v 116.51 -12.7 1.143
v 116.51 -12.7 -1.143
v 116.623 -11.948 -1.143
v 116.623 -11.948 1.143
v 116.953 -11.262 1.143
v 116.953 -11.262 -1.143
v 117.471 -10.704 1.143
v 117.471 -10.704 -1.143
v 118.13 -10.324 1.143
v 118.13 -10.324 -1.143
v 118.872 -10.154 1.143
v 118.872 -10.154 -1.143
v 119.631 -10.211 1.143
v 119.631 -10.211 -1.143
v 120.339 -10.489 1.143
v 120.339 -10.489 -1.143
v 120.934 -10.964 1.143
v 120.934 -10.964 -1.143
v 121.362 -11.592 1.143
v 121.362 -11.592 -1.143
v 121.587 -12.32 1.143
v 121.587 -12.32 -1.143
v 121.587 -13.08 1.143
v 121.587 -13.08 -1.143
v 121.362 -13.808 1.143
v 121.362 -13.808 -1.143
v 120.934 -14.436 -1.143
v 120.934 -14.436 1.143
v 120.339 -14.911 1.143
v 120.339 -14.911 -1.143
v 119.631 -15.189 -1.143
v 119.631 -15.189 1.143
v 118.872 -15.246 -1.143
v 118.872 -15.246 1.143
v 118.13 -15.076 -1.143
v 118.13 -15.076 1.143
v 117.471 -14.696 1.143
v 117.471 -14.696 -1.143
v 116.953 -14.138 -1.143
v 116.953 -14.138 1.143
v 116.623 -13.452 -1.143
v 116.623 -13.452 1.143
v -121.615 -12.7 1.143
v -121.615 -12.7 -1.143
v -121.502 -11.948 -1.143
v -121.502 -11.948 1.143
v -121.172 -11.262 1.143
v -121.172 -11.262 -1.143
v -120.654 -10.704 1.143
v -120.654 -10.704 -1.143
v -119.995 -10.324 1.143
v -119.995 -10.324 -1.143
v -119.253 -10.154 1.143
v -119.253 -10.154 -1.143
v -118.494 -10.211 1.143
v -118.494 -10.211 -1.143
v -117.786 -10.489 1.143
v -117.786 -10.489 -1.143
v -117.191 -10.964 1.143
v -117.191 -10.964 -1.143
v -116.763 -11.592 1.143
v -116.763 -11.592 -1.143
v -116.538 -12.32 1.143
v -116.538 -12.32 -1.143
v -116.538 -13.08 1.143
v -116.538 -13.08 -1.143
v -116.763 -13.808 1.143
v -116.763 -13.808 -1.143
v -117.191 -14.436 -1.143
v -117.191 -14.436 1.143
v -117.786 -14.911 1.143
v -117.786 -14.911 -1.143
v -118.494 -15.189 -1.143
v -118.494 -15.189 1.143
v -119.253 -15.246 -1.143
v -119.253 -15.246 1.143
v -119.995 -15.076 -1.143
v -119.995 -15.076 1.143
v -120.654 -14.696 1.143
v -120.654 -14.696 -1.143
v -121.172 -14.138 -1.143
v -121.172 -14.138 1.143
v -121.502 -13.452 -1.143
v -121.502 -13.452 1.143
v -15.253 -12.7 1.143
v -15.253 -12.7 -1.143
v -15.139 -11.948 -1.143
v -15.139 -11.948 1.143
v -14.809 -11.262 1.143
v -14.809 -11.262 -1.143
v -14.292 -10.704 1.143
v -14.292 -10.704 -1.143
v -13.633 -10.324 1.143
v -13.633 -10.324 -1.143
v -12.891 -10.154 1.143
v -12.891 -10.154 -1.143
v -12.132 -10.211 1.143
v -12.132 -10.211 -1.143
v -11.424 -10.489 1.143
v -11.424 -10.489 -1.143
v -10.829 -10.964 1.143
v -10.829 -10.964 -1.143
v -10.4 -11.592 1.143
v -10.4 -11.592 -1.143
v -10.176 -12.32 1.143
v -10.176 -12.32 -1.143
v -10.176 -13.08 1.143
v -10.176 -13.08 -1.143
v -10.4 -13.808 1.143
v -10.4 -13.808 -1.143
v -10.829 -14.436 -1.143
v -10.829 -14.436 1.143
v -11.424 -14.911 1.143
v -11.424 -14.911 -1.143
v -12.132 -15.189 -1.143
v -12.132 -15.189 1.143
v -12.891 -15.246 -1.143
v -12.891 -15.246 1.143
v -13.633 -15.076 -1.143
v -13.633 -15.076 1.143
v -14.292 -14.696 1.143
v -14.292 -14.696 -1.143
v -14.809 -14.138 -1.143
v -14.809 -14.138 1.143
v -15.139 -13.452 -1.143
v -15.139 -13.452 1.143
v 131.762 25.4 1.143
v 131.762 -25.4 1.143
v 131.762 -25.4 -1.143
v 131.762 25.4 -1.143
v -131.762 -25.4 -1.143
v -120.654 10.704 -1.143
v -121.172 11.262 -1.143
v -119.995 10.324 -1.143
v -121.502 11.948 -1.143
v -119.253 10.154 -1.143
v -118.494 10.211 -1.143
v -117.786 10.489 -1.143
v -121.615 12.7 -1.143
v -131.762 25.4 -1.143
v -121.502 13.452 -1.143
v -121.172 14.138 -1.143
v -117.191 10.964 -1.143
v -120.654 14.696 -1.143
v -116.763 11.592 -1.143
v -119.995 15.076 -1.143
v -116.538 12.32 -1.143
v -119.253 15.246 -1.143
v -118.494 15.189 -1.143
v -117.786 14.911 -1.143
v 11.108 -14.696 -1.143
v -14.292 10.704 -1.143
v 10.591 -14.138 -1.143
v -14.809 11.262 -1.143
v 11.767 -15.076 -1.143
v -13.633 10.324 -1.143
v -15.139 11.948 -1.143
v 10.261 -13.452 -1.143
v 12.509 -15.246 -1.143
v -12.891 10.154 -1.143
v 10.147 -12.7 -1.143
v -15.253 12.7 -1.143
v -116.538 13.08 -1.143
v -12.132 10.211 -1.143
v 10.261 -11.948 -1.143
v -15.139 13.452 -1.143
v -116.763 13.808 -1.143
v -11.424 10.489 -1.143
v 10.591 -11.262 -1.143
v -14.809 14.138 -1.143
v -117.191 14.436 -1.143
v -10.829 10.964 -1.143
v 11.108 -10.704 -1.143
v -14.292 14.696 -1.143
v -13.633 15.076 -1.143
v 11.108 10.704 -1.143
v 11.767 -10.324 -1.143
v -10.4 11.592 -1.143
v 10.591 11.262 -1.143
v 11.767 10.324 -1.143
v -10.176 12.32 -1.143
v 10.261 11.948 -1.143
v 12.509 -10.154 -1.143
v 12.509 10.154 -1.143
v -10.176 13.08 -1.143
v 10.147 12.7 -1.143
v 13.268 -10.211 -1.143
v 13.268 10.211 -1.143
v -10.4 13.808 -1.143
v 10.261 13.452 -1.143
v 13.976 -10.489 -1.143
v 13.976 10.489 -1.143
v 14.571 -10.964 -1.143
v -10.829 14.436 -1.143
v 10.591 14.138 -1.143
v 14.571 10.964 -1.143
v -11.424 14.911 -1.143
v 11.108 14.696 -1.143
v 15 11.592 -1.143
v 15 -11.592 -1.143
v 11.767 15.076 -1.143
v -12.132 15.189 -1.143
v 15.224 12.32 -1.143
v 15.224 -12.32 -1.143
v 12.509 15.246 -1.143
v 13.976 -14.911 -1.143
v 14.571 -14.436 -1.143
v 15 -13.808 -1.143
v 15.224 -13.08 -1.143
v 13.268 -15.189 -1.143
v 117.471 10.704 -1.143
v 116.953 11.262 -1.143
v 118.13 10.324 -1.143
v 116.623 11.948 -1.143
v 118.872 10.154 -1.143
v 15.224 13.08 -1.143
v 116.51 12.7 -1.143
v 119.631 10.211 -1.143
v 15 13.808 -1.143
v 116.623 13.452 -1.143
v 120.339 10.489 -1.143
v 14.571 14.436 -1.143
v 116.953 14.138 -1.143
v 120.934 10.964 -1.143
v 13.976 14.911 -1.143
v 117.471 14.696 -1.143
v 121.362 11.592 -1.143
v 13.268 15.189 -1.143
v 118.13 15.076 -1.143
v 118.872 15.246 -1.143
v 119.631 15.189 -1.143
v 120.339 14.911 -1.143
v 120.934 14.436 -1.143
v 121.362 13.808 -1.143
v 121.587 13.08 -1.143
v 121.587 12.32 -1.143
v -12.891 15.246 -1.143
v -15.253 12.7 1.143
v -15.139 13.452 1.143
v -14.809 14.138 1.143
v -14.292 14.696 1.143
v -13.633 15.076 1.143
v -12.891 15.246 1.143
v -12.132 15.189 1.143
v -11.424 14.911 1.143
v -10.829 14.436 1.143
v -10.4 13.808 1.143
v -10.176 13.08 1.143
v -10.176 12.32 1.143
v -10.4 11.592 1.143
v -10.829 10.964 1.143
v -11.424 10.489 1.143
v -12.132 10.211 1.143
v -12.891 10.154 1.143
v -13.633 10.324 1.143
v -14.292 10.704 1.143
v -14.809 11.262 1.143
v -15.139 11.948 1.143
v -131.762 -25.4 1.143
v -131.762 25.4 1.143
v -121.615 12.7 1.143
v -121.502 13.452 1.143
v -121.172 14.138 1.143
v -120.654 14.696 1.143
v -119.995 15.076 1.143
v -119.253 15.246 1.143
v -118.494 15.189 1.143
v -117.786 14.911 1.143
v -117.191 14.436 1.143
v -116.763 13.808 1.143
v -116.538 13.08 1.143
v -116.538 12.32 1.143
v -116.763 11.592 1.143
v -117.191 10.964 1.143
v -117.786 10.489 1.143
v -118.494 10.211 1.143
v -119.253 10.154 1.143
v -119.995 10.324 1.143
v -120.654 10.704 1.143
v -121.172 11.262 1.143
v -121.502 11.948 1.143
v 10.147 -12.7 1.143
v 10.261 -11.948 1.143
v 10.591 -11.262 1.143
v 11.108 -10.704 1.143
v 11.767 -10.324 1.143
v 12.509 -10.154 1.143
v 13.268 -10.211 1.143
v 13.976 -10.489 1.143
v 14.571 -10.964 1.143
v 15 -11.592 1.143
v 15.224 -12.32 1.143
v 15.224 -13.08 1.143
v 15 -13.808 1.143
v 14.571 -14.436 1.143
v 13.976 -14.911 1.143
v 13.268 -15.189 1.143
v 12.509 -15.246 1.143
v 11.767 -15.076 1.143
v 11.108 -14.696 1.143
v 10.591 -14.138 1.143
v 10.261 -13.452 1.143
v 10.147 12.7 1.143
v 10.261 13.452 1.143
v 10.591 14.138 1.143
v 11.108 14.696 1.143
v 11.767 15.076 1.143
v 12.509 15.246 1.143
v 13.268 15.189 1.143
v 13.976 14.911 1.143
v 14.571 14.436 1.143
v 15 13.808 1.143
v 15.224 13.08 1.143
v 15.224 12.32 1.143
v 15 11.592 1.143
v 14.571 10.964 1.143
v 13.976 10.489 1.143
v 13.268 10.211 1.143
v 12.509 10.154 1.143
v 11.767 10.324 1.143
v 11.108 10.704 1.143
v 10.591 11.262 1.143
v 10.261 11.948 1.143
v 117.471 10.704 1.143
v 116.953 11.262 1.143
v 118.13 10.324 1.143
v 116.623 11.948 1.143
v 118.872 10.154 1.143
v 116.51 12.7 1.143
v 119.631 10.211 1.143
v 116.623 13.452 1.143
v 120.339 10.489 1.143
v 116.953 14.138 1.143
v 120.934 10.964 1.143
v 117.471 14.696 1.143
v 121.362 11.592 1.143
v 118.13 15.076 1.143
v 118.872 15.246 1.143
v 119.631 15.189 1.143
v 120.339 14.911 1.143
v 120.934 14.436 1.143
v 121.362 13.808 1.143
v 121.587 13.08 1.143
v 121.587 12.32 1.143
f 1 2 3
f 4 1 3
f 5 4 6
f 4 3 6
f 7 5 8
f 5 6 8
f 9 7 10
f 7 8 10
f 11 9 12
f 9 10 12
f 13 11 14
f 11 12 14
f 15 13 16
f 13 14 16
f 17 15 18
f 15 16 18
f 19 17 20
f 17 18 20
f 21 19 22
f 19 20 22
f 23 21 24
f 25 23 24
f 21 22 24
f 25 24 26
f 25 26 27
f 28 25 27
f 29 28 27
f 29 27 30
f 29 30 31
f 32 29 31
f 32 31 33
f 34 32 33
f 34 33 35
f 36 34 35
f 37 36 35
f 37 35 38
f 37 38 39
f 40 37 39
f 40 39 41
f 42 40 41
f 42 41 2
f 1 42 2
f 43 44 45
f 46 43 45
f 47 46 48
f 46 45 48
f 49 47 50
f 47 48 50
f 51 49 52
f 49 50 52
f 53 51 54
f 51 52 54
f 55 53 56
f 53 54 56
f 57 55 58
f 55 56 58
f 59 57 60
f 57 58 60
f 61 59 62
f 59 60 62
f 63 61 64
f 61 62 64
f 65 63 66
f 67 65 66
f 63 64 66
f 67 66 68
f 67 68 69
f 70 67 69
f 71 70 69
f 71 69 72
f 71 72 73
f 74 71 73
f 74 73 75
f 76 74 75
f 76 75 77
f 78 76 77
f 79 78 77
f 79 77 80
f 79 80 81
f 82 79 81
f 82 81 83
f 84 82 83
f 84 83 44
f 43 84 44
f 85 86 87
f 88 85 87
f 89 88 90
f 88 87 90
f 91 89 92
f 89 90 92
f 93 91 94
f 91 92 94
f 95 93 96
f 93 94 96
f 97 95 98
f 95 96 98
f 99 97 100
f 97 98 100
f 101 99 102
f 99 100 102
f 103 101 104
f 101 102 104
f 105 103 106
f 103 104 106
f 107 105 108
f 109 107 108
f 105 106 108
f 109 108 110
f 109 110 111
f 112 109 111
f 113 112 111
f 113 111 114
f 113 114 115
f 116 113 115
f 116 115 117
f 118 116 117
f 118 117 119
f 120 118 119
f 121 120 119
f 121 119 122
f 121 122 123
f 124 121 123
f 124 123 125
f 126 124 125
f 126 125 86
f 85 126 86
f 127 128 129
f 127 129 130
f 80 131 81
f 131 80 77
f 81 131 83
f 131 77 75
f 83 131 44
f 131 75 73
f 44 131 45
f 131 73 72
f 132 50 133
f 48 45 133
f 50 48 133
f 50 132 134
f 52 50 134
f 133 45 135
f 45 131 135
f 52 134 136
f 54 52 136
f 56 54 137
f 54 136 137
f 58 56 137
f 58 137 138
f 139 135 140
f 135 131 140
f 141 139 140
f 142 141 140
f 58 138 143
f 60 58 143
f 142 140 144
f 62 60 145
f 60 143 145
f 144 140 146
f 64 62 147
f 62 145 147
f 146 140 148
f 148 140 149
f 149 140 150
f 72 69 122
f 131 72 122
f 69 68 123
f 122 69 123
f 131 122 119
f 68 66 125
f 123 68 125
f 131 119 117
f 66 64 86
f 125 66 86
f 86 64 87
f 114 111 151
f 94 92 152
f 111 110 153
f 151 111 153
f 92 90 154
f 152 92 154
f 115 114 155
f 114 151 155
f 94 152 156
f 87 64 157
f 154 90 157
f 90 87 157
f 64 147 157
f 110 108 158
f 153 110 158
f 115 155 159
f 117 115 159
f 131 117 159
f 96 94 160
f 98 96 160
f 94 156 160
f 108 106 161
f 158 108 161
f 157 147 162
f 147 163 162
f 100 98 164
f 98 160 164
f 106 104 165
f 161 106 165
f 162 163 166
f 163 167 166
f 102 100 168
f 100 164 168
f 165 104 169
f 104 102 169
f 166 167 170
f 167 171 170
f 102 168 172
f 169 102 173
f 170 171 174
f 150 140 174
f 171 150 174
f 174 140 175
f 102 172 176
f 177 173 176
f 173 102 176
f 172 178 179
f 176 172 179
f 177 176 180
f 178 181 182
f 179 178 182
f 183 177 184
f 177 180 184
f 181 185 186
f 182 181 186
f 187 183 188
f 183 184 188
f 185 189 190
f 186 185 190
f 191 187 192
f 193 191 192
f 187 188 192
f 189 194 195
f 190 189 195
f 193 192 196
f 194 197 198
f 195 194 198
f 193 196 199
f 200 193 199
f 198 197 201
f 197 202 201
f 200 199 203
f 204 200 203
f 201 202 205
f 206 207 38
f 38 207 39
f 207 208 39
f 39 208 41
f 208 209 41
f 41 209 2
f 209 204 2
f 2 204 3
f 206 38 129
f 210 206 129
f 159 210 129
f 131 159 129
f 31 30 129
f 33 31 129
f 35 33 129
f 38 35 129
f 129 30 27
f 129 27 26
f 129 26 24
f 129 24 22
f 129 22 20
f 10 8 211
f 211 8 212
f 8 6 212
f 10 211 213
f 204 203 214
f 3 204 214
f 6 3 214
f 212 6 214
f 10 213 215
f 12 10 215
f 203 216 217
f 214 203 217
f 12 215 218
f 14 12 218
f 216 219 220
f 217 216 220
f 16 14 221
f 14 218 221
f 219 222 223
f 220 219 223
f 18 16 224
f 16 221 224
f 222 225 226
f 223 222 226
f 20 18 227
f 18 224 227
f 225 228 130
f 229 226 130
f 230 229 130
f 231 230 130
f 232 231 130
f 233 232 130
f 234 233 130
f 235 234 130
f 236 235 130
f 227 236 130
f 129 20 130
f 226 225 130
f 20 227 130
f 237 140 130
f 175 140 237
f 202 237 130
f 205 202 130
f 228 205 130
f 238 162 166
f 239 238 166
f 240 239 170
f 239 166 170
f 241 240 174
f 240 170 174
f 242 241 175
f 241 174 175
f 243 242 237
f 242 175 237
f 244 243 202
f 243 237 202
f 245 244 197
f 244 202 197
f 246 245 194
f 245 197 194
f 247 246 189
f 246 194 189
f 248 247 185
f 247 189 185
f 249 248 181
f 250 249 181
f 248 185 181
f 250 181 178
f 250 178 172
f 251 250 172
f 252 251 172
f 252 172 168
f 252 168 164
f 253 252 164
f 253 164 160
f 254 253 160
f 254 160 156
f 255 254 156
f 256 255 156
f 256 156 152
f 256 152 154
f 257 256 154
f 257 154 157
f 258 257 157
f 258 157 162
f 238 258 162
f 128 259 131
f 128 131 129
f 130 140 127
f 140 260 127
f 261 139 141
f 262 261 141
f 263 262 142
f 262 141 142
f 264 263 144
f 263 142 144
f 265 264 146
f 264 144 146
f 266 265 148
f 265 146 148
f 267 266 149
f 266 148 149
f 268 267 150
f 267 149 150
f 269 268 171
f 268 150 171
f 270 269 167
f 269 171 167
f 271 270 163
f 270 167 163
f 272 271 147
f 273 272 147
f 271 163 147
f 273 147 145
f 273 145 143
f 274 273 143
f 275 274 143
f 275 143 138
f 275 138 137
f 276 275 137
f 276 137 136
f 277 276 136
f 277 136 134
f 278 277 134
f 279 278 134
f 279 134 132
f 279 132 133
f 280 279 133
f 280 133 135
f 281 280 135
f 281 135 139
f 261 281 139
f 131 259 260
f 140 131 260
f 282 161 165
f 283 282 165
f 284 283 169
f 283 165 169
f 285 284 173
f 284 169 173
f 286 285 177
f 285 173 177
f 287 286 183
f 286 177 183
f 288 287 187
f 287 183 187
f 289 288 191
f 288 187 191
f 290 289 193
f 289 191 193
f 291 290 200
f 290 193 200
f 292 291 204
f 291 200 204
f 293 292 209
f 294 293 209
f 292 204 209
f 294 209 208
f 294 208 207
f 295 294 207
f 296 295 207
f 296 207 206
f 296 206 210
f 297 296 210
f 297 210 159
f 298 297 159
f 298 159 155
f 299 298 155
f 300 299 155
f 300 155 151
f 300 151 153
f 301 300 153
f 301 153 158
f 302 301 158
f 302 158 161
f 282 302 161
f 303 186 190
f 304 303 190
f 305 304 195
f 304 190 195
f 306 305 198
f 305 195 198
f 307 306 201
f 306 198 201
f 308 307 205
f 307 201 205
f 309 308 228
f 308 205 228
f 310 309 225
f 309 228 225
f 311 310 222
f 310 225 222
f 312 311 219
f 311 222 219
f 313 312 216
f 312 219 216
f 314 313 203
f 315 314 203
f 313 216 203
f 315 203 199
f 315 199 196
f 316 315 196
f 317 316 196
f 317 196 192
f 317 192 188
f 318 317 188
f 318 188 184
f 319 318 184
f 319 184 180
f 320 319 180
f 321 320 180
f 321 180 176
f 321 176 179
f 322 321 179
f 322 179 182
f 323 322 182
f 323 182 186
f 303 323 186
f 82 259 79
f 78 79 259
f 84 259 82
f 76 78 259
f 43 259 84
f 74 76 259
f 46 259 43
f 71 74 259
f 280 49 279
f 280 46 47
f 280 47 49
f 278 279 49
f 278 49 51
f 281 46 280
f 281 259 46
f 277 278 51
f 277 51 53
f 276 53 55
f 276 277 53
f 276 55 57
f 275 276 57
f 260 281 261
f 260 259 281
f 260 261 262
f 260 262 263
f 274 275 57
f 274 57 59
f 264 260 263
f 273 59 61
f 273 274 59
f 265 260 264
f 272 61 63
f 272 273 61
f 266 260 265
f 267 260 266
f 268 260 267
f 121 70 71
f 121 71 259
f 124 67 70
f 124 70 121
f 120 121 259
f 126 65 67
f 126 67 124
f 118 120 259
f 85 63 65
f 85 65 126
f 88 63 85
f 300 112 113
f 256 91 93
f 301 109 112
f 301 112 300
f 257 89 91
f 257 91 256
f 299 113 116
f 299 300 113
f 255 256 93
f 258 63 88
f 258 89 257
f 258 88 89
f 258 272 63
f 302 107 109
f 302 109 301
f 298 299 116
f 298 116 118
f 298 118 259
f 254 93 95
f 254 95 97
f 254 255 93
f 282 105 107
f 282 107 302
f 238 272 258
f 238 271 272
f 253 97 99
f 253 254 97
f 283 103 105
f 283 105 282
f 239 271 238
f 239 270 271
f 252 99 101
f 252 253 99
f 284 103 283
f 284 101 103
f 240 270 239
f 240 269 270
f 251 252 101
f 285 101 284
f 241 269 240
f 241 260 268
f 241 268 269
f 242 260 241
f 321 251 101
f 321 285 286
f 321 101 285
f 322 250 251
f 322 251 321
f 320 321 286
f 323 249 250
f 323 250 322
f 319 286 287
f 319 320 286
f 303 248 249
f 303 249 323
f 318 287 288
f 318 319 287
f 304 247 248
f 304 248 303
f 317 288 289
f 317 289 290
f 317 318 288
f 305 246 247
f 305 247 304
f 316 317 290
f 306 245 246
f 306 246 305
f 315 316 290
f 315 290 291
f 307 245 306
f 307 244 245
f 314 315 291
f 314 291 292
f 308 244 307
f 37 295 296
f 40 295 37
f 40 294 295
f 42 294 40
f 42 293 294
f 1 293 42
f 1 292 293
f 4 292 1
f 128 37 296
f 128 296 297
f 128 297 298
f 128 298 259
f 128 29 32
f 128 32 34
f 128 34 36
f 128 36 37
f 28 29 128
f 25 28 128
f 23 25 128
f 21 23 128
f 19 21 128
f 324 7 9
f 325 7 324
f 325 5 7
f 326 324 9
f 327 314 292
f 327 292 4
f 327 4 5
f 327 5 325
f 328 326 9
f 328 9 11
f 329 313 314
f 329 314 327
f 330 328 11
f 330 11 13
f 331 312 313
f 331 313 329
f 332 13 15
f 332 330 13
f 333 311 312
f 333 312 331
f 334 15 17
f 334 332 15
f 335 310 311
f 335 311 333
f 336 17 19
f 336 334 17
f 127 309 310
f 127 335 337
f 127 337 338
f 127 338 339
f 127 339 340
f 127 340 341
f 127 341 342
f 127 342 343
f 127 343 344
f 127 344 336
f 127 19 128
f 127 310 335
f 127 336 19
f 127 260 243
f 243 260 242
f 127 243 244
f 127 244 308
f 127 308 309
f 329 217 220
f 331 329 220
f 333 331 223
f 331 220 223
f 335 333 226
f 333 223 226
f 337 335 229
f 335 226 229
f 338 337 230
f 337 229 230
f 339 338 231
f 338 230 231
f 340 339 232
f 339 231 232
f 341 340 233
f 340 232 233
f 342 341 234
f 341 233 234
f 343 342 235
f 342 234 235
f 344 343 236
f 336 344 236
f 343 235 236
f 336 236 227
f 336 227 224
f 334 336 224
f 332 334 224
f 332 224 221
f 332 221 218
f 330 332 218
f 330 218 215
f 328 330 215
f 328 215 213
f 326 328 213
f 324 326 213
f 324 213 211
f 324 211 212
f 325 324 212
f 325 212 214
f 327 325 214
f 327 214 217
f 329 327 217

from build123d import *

# Parameters (mm, degrees)
SKETCH1_W              = 263.525
SKETCH1_H              = 50.8
BOSS_EXTRUDE1_DEPTH    = 1.143
F_10_CLEARANCE_HOLE1_D = 5.1054


with BuildPart() as part:
    # Sketch1 → Boss-Extrude1 (new, symmetric)
    with BuildSketch(Plane.XY):
        Rectangle(SKETCH1_W, SKETCH1_H)
    extrude(amount=BOSS_EXTRUDE1_DEPTH, both=True)

    # #10 Clearance Hole1 (through all)
    with Locations(Plane.XY.offset(1.143)):
        with Locations((-119.0625, 12.7), (-119.0625, -12.7), (-12.7, 12.7), (-12.7, -12.7), (12.7, -12.7), (12.7, 12.7), (119.0625, 12.7), (119.0625, -12.7)):
            Hole(F_10_CLEARANCE_HOLE1_D / 2)


solid = part.part
